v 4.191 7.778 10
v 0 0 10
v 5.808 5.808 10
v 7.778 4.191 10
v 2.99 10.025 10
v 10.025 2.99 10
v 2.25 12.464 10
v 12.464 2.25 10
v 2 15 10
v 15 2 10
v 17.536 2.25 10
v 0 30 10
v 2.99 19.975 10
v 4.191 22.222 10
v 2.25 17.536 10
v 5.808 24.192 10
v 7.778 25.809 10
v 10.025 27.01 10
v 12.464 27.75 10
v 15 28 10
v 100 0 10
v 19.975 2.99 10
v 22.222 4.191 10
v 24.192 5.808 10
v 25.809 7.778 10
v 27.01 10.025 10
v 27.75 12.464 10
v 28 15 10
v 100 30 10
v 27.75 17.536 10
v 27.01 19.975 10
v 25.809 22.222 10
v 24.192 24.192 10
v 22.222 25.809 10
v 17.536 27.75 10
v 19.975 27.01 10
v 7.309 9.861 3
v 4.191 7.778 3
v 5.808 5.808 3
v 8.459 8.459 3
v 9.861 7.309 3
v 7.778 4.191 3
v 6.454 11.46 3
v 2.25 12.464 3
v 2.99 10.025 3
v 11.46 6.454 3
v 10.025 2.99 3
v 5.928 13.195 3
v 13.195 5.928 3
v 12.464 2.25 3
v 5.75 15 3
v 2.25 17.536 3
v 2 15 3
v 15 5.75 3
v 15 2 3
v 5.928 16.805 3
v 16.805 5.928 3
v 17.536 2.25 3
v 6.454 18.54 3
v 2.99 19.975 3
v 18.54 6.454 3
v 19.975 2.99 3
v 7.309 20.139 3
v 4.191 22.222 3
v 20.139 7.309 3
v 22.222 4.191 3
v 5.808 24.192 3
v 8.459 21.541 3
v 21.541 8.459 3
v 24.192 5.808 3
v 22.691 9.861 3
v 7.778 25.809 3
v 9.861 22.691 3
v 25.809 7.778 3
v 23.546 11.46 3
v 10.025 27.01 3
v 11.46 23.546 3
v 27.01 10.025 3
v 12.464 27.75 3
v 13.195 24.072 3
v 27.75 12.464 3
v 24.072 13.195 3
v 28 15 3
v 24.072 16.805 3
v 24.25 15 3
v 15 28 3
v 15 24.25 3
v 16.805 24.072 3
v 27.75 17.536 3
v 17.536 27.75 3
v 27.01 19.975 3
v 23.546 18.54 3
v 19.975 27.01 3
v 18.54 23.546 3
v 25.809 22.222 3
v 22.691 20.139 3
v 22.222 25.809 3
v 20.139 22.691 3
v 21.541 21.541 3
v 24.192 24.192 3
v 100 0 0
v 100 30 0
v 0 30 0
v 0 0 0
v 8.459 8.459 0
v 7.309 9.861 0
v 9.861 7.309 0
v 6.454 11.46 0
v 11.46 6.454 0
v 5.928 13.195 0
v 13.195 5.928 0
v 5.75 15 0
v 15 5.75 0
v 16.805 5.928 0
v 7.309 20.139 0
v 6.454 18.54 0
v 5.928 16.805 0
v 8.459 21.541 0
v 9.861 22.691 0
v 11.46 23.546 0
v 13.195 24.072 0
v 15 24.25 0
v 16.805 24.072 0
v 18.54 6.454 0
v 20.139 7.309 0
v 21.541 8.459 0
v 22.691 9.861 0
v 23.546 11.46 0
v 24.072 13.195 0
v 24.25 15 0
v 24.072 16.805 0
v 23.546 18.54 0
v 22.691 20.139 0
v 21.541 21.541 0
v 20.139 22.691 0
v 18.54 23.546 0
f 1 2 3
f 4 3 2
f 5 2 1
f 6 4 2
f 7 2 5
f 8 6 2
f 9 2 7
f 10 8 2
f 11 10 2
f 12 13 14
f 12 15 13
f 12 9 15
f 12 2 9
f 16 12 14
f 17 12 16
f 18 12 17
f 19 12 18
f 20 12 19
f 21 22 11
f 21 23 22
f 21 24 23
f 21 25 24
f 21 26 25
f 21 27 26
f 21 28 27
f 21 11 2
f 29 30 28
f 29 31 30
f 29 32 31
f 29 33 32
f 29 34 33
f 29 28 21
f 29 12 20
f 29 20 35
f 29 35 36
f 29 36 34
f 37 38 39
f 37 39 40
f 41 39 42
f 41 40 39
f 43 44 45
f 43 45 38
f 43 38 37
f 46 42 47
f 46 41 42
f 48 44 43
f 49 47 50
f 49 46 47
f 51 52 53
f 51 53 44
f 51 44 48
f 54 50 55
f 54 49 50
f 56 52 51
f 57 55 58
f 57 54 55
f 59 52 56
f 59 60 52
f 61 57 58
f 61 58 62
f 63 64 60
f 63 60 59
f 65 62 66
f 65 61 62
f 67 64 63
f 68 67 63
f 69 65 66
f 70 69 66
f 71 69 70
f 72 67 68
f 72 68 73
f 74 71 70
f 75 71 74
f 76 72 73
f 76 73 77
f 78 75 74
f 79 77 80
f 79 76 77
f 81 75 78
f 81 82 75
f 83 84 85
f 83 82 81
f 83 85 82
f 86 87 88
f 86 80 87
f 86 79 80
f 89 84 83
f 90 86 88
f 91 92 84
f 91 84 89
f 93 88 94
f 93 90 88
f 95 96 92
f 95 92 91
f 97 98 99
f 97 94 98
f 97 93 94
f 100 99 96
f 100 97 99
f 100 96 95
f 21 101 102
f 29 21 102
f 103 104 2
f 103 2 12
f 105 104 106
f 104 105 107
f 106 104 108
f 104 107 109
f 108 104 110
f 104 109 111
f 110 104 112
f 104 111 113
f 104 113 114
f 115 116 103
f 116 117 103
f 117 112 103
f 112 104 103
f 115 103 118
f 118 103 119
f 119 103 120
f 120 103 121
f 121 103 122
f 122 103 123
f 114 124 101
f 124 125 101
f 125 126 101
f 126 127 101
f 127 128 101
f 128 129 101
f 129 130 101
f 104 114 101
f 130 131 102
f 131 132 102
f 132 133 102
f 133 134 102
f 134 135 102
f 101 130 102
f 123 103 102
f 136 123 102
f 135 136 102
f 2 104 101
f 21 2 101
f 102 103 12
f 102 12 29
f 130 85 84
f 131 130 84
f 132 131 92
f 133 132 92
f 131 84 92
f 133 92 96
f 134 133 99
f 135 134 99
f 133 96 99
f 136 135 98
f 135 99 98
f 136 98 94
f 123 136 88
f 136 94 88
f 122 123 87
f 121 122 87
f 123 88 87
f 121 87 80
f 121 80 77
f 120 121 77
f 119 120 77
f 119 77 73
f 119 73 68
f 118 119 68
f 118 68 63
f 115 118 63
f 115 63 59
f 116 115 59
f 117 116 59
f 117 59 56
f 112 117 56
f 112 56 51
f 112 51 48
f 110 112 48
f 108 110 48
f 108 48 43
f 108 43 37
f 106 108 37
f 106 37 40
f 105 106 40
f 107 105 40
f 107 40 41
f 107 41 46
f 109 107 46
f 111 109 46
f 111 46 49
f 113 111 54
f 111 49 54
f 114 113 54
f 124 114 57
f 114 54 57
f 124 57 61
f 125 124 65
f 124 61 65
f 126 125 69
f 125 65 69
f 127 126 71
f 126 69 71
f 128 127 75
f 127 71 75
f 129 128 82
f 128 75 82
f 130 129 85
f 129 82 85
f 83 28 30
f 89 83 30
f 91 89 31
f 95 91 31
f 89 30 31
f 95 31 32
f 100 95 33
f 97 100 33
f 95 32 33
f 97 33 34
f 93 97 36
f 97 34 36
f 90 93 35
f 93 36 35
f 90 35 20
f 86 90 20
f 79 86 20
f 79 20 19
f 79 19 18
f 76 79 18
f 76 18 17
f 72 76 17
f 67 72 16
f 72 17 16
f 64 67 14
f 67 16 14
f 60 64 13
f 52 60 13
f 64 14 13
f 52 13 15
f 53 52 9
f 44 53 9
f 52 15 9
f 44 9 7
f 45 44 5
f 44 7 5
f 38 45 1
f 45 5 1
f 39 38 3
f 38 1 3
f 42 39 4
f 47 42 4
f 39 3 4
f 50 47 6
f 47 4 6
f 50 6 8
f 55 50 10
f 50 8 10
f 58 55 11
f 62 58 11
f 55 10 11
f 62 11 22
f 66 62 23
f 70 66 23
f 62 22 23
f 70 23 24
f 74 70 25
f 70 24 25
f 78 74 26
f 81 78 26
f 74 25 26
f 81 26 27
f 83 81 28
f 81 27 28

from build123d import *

# Parameters (mm, degrees)
ESBO_O1_W                = 100
ESBO_O1_H                = 30
RESSALTO_EXTRUS_O1_DEPTH = 10
ESBO_O2_R                = 13
CORTE_EXTRUS_O1_DEPTH    = 7
ESBO_O4_R                = 9.25
CORTE_EXTRUS_O3_DEPTH    = 105.637469388
ESBO_O3_W                = 30
ESBO_O3_H                = 30
CORTE_EXTRUS_O2_DEPTH    = 2


with BuildPart() as part:
    # Esboço1 → Ressalto-extrusão1 (new body)
    with BuildSketch(Plane.XY):
        with Locations((50, 15)):
            Rectangle(ESBO_O1_W, ESBO_O1_H)
    extrude(amount=RESSALTO_EXTRUS_O1_DEPTH)

    # Esboço2 → Corte-extrusão1 (cut)
    with BuildSketch(Plane.XY.offset(10)):
        with Locations((15, 15)):
            Circle(ESBO_O2_R)
    extrude(amount=-CORTE_EXTRUS_O1_DEPTH, mode=Mode.SUBTRACT)

    # Esboço4 → Corte-extrusão3 (cut, through all)
    with BuildSketch(Plane.XY.offset(3)):
        with Locations((15, 15)):
            Circle(ESBO_O4_R)
    extrude(amount=-CORTE_EXTRUS_O3_DEPTH, mode=Mode.SUBTRACT)

    # Esboço3 → Corte-extrusão2 (cut)
    with BuildSketch(Plane.XY.offset(10)):
        with Locations((-35, 3.5)):
            Rectangle(ESBO_O3_W, ESBO_O3_H)
    extrude(amount=-CORTE_EXTRUS_O2_DEPTH, mode=Mode.SUBTRACT)


solid = part.part
